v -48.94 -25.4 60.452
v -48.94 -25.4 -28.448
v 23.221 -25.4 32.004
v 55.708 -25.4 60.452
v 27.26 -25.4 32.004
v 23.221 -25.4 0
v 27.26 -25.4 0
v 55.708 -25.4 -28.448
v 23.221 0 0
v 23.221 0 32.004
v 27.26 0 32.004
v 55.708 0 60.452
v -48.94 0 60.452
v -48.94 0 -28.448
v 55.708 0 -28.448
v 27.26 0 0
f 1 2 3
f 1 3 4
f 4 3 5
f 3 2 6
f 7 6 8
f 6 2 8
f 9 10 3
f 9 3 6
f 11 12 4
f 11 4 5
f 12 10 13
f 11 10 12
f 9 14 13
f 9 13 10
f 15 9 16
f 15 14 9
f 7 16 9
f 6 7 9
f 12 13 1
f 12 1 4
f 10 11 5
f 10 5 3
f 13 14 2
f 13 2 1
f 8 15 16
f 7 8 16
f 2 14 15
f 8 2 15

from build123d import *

# Parameters (mm, degrees)
F0_W     = 72.161538
F0_H     = 16.002
F1_DEPTH = 25.4


with BuildPart() as f1:
    # F0 (on Front) → F1 (new body)
    with BuildSketch(Plane.XZ):
        Polygon((-48.940382, 0), (-48.940382, -28.448), (55.707618, -28.448), (27.259618, 0), (23.221156, 0), align=None)
        with Locations((-12.859613, 8.001)):
            Rectangle(F0_W, F0_H)
    extrude(amount=F1_DEPTH)

    # F2: F1 across face


with BuildPart() as f1_1:
    add(f1.part)
    add(f1.part.mirror(Plane(origin=(-12.859613, -12.7, 16.002), x_dir=(1, 0, 0), z_dir=(0, 0, 1))))


solid = f1_1.part
